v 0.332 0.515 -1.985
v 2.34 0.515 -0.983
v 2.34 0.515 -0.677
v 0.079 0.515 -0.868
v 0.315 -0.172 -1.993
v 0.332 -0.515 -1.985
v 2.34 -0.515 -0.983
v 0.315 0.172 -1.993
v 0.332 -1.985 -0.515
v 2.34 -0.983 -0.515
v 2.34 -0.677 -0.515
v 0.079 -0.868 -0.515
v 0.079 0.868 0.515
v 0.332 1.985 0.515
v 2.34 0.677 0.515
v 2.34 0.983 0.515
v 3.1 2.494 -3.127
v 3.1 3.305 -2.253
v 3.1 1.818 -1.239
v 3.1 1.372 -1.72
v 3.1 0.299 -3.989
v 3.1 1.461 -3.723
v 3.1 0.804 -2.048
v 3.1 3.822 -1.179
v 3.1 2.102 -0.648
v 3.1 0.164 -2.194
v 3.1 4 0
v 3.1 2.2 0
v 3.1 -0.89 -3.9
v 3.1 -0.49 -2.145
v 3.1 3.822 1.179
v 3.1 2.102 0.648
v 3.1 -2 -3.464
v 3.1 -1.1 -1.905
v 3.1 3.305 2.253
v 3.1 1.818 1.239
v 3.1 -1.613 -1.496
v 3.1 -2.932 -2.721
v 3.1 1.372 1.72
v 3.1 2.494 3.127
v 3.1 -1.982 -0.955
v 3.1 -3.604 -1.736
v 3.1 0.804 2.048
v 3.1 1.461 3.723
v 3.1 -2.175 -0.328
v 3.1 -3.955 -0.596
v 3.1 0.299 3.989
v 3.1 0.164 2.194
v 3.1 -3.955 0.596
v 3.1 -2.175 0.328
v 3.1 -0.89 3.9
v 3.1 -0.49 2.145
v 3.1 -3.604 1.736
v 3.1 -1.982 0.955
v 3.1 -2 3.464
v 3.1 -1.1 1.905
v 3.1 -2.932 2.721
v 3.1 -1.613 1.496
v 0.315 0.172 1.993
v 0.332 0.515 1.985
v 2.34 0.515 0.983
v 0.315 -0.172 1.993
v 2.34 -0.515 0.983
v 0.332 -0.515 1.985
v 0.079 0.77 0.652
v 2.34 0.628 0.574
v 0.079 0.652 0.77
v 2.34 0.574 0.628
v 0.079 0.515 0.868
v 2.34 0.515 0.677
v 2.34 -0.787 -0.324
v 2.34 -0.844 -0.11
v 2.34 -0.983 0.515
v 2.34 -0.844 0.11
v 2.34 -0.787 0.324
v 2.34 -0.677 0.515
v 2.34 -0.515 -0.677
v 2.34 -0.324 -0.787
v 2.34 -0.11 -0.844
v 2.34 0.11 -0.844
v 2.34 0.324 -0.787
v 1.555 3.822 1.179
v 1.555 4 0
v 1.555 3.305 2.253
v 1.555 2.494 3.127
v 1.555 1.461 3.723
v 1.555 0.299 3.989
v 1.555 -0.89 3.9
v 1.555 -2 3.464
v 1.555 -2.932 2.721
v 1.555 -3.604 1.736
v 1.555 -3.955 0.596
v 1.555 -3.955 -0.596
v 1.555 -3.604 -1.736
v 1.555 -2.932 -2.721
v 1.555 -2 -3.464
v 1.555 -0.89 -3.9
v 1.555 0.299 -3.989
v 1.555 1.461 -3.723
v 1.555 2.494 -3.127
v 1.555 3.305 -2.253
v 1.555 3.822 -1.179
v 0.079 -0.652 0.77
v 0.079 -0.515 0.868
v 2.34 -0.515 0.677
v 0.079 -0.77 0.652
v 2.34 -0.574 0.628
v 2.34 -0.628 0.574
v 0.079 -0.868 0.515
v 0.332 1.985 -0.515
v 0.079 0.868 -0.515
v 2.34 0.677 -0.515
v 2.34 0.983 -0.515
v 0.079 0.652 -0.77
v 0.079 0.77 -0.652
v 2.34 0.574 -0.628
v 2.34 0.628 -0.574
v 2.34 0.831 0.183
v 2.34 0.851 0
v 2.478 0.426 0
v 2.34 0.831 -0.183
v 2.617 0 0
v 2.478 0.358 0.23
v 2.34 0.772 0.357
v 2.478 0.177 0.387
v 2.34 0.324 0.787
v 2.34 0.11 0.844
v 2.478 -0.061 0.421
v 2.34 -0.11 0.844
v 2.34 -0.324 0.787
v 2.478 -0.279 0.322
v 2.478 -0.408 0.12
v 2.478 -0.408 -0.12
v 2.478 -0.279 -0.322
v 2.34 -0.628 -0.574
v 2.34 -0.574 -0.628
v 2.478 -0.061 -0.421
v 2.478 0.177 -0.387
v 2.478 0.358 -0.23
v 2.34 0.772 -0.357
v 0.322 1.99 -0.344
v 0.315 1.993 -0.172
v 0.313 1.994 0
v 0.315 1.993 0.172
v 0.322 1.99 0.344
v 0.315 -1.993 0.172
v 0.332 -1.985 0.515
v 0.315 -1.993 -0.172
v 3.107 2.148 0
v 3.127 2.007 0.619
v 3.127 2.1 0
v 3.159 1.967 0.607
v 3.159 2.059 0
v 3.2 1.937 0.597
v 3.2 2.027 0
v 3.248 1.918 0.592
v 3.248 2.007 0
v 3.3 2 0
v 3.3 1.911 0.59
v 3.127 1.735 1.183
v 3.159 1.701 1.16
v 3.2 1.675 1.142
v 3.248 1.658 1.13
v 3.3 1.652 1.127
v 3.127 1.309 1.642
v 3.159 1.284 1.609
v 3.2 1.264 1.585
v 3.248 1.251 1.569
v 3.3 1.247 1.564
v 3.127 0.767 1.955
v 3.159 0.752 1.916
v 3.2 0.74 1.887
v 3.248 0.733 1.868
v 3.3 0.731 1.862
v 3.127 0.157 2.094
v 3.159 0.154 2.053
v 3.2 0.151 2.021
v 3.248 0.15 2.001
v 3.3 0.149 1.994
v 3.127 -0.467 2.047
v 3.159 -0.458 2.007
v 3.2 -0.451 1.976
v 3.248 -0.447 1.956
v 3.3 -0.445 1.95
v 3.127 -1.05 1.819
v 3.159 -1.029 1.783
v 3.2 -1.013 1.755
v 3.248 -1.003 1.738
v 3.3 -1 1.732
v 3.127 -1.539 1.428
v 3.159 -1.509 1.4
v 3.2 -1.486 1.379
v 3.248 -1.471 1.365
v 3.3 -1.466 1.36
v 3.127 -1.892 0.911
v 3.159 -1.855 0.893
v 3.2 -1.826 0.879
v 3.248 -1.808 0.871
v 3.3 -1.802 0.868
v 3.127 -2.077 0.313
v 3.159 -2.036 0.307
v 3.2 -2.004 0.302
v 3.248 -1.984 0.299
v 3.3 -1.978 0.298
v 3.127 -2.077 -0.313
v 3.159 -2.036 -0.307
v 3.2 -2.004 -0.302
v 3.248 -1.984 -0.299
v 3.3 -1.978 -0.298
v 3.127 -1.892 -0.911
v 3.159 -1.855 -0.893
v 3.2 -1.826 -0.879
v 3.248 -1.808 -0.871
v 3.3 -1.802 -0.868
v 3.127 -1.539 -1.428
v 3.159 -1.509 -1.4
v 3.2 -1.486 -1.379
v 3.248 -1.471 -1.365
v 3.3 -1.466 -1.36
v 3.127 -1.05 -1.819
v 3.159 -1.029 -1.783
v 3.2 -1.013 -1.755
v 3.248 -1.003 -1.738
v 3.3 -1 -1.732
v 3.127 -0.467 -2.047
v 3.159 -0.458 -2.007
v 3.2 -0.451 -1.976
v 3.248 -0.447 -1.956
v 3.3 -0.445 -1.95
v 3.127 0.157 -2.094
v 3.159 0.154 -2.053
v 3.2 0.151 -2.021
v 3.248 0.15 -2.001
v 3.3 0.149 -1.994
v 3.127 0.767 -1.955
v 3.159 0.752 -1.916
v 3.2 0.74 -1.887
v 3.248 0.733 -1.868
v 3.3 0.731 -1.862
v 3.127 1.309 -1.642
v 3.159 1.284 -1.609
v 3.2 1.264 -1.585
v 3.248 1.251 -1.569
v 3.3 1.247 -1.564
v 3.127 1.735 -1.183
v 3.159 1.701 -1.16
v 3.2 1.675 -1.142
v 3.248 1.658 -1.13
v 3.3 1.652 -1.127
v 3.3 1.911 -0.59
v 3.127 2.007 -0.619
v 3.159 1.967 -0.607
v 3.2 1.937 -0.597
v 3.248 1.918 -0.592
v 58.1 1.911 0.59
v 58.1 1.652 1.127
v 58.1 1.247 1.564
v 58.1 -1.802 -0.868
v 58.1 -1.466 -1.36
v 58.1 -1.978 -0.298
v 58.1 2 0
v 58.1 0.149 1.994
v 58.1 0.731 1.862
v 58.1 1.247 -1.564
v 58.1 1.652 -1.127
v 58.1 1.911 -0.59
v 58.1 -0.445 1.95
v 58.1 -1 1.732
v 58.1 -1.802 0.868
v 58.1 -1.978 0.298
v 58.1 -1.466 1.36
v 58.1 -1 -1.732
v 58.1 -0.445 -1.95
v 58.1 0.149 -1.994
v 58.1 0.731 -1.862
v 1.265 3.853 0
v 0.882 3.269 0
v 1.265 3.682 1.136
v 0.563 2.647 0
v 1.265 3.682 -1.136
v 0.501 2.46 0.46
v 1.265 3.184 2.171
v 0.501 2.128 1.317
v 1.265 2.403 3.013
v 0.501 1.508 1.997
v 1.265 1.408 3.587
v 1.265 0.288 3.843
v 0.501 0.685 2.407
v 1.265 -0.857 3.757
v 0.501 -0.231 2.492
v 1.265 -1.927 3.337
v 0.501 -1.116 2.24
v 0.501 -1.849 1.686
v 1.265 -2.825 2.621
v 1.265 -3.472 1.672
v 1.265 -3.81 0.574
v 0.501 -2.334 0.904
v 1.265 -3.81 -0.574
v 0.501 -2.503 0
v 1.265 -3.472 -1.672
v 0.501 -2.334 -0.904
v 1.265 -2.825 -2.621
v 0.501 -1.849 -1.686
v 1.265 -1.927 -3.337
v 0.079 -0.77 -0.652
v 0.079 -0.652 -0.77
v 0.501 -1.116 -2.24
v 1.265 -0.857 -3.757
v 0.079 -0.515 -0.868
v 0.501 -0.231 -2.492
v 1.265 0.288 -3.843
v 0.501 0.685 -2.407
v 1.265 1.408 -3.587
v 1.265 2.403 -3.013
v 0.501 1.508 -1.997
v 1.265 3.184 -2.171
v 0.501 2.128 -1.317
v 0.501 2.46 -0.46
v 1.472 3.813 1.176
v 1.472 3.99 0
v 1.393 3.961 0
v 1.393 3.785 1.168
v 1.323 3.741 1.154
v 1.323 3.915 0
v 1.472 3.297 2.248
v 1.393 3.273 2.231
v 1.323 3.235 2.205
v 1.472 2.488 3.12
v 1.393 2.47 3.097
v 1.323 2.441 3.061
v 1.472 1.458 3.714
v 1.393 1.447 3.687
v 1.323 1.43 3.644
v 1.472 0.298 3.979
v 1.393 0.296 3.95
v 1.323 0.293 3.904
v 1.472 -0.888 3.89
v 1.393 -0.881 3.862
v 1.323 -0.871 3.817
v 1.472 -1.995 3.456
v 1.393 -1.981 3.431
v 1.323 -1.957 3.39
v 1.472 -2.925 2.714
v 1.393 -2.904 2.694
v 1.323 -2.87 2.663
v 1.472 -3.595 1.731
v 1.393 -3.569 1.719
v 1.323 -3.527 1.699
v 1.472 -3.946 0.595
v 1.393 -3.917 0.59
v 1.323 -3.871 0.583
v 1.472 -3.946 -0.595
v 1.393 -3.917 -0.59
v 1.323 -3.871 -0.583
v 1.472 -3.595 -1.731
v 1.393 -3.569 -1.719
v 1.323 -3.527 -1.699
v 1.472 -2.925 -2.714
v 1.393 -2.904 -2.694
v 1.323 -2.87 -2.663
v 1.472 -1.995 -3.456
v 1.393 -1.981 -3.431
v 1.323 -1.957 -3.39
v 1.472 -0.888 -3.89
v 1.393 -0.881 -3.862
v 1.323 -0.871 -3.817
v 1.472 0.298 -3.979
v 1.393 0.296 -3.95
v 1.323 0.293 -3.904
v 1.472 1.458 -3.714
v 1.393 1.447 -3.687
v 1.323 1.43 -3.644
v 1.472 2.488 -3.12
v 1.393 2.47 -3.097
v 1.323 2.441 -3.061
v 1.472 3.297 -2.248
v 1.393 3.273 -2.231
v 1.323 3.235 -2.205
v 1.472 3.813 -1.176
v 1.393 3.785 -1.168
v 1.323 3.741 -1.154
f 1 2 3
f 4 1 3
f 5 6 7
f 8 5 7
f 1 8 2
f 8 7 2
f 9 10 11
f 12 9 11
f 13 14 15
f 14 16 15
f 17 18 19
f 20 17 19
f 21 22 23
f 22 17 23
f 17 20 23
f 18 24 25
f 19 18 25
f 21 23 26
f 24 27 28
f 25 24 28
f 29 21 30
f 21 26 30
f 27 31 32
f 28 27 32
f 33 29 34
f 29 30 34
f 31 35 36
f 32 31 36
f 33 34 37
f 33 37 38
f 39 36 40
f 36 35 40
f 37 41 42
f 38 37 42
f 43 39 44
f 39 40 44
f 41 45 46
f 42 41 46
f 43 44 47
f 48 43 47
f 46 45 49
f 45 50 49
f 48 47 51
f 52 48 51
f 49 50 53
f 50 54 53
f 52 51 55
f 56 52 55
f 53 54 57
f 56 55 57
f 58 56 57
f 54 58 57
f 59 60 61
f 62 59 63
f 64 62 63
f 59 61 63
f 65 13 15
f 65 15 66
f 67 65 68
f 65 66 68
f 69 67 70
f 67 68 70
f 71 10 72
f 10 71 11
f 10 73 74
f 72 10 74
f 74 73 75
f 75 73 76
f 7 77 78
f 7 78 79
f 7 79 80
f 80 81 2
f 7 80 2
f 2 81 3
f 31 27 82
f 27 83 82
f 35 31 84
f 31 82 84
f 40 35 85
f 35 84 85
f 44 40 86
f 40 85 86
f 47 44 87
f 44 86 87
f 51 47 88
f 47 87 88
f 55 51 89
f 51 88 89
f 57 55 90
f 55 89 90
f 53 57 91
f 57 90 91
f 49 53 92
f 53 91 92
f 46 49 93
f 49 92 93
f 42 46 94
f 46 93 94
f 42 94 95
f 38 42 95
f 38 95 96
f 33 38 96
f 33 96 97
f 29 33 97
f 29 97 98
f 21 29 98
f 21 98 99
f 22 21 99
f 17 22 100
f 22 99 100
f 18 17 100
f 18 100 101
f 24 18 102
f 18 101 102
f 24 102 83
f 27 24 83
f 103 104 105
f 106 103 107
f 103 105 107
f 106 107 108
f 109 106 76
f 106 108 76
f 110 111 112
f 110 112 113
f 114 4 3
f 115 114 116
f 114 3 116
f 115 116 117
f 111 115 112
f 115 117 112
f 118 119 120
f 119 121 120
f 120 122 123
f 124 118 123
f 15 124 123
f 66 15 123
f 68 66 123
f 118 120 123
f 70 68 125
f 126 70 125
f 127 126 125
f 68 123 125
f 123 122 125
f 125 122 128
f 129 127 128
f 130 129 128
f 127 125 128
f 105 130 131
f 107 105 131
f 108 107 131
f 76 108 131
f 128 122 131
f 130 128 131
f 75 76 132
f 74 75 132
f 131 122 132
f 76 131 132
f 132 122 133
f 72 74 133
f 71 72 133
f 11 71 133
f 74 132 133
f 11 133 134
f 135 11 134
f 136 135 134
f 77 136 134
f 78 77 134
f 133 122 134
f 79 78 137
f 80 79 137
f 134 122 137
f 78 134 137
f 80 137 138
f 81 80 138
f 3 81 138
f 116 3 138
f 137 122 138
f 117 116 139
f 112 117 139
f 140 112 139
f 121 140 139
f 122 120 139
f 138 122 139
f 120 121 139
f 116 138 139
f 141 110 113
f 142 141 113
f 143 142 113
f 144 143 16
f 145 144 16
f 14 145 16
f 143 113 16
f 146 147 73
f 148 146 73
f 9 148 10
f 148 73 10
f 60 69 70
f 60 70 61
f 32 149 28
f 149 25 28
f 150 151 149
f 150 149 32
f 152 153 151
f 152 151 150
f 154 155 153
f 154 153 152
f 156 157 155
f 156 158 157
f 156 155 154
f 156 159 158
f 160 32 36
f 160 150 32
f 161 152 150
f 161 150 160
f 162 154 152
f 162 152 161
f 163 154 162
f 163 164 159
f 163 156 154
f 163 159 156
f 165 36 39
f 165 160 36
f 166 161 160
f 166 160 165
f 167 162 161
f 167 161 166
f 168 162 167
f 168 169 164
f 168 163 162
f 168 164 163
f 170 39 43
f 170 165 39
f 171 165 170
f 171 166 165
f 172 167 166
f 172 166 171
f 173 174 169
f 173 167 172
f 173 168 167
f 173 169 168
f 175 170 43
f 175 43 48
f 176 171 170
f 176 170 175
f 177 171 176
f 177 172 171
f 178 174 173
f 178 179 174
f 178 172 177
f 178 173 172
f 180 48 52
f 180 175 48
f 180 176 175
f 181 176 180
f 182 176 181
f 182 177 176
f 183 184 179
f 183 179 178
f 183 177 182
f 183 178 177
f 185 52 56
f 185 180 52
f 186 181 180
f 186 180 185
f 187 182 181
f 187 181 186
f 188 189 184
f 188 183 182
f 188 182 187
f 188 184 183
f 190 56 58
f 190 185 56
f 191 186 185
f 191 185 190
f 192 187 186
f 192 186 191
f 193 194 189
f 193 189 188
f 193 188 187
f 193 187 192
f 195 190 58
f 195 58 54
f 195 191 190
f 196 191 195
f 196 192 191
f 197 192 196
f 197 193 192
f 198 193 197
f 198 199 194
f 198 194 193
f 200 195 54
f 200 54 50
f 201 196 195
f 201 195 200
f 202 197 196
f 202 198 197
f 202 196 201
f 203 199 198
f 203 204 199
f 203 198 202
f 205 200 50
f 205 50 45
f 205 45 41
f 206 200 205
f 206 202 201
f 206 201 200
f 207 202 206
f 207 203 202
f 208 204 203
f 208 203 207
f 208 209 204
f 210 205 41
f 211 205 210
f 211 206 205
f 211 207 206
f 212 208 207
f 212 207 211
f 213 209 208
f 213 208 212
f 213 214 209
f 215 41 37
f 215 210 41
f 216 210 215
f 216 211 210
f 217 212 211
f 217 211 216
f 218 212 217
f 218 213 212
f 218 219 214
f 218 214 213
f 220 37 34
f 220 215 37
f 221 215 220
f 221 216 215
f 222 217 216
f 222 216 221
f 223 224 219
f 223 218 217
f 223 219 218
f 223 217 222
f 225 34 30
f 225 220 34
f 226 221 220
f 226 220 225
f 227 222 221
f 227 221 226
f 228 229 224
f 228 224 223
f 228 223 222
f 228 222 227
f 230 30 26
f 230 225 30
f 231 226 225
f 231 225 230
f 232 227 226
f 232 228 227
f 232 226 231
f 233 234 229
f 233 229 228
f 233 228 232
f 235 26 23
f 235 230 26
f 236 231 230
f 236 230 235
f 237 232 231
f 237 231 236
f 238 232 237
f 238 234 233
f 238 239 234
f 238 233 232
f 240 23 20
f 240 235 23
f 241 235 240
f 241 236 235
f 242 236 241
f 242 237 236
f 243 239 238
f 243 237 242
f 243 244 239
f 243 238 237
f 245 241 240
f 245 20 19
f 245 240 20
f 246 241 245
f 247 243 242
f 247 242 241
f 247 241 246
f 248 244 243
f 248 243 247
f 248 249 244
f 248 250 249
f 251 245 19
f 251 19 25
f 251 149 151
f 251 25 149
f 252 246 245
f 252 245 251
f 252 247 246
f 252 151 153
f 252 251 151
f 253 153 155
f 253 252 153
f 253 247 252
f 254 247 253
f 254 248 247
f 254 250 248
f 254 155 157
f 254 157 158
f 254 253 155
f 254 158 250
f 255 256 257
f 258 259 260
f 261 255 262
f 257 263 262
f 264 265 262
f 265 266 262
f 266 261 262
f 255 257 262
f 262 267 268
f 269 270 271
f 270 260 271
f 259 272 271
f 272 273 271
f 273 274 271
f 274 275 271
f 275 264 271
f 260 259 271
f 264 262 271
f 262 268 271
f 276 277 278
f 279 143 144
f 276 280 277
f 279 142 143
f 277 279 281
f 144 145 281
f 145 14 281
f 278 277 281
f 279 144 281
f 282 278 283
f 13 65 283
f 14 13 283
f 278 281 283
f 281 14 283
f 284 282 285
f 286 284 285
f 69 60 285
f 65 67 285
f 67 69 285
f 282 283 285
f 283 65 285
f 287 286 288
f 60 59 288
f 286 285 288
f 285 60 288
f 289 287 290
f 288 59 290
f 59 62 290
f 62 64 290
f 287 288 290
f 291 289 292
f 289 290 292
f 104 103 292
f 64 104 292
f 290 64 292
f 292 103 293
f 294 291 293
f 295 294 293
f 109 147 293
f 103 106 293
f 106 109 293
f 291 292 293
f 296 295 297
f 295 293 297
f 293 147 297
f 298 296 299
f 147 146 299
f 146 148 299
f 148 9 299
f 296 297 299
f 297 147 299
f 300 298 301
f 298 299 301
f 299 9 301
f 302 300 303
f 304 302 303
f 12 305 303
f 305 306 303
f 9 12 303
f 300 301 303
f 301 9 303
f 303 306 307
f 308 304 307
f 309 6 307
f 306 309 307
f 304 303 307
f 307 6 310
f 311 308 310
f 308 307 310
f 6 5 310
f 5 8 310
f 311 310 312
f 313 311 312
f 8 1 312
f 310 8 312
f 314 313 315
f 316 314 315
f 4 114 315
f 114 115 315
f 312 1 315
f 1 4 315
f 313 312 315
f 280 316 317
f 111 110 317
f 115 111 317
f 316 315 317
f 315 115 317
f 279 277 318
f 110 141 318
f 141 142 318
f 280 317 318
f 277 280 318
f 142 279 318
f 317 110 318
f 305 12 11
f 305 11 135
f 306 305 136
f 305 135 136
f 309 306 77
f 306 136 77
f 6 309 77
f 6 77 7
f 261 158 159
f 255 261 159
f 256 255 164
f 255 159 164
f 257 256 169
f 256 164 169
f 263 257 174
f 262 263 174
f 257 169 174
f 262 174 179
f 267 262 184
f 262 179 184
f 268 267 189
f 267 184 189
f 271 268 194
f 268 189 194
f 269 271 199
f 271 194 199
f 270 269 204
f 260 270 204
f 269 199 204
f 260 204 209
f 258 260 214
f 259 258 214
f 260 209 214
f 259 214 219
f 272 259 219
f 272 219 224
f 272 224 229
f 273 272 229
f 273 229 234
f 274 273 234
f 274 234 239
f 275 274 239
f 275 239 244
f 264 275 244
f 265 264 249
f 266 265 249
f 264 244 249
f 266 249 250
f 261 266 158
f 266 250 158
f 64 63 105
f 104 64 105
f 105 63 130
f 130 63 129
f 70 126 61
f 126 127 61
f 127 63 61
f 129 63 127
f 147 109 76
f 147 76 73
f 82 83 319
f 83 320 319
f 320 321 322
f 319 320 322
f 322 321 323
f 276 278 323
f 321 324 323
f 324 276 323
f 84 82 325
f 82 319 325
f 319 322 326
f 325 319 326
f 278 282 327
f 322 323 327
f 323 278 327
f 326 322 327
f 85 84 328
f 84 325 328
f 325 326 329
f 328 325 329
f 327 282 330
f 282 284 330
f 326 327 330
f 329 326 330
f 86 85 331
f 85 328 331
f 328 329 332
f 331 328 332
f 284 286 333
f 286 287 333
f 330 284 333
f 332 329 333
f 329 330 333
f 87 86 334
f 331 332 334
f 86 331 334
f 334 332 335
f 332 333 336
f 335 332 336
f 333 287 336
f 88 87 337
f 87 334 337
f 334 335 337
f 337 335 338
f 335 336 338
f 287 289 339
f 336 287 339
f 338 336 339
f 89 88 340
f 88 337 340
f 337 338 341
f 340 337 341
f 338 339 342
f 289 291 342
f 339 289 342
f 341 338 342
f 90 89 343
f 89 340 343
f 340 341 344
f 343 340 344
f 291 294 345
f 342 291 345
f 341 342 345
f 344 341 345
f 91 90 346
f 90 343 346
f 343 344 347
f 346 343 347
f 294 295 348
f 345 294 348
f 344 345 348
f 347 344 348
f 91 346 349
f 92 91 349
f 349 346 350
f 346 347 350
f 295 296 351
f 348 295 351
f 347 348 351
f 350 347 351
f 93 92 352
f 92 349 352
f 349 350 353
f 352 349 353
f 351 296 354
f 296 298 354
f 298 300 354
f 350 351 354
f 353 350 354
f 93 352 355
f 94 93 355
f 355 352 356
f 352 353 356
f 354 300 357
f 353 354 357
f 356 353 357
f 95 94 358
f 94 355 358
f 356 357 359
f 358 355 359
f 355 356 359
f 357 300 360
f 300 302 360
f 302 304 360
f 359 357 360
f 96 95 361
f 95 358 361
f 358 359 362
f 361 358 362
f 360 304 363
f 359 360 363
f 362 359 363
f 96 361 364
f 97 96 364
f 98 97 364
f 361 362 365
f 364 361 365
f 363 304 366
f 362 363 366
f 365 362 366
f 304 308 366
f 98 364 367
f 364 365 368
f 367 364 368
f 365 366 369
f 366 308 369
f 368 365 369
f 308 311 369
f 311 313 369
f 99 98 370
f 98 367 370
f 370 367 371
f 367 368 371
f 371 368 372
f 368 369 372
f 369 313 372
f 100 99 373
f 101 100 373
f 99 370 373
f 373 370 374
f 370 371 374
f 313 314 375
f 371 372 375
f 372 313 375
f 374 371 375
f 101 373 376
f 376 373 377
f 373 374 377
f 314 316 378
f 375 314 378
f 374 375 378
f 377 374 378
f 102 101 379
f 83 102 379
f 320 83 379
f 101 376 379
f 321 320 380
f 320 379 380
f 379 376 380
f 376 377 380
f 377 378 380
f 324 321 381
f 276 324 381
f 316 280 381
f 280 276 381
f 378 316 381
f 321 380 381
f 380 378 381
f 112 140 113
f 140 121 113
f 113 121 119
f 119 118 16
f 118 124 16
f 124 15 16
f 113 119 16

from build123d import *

# Parameters (mm, degrees)
FILLET1_R    = 0.2
SKETCH3_W    = 1.03
SKETCH3_H    = 4.3
SKETCH4_W    = 1.03
SKETCH4_H    = 1.966638464
RECPAT_COUNT = 2
RECPAT_ANGLE = 90


with BuildPart() as part:
    # BodySke → Base-Revolve (revolve)
    with BuildSketch(Plane.XY):
        with BuildLine():
            Line((3.1, 2), (3.1, 4))
            Line((3.1, 4), (1.555305874, 4))
            ThreePointArc((1.555305874, 4), (1.392873227, 3.961271902), (1.265388955, 3.853420195))
            ThreePointArc((1.265388955, 3.853420195), (0.324444487, 2.027933456), (0, 0))
            Line((0, 0), (58.1, 0))
            Line((58.1, 0), (58.1, 2))
            Line((58.1, 2), (3.1, 2))
        make_face()
    revolve(axis=Axis((-25.4, 0, 0), (1, 0, 0)))

    # Fillet1
    fillet1_edges = [part.edges().sort_by_distance(p)[0] for p in [
        (3.1, -2, 0),
    ]]
    fillet(fillet1_edges, radius=FILLET1_R)

    # Sketch3 → Recess section 0
    with BuildSketch(Plane(origin=(0, 0, 0), x_dir=(0, 0, -1), z_dir=(1, 0, 0))):
        Rectangle(SKETCH3_W, SKETCH3_H)
    # Sketch4 → Recess section 1
    with BuildSketch(Plane(origin=(2.34, 0, 0), x_dir=(0, 0, -1), z_dir=(1, 0, 0))):
        Rectangle(SKETCH4_W, SKETCH4_H)
    recess = loft(mode=Mode.SUBTRACT)

    # RecPat: Recess ×2 about axis
    recpat_axis = Axis((0, 0, 0), (1, 0, 0))
    for i in range(1, RECPAT_COUNT):
        add(recess.rotate(recpat_axis, i * RECPAT_ANGLE / (RECPAT_COUNT - 1)), mode=Mode.SUBTRACT)

    # RecCorSke → RecessCore (revolve, cut)
    with BuildSketch(Plane.XY):
        Polygon((0, 0), (0, 1.01462874), (2.34, 0.851), (2.616506661, 0), align=None)
    revolve(axis=Axis((-3.175, 0, 0), (1, 0, 0)), mode=Mode.SUBTRACT)


solid = part.part
